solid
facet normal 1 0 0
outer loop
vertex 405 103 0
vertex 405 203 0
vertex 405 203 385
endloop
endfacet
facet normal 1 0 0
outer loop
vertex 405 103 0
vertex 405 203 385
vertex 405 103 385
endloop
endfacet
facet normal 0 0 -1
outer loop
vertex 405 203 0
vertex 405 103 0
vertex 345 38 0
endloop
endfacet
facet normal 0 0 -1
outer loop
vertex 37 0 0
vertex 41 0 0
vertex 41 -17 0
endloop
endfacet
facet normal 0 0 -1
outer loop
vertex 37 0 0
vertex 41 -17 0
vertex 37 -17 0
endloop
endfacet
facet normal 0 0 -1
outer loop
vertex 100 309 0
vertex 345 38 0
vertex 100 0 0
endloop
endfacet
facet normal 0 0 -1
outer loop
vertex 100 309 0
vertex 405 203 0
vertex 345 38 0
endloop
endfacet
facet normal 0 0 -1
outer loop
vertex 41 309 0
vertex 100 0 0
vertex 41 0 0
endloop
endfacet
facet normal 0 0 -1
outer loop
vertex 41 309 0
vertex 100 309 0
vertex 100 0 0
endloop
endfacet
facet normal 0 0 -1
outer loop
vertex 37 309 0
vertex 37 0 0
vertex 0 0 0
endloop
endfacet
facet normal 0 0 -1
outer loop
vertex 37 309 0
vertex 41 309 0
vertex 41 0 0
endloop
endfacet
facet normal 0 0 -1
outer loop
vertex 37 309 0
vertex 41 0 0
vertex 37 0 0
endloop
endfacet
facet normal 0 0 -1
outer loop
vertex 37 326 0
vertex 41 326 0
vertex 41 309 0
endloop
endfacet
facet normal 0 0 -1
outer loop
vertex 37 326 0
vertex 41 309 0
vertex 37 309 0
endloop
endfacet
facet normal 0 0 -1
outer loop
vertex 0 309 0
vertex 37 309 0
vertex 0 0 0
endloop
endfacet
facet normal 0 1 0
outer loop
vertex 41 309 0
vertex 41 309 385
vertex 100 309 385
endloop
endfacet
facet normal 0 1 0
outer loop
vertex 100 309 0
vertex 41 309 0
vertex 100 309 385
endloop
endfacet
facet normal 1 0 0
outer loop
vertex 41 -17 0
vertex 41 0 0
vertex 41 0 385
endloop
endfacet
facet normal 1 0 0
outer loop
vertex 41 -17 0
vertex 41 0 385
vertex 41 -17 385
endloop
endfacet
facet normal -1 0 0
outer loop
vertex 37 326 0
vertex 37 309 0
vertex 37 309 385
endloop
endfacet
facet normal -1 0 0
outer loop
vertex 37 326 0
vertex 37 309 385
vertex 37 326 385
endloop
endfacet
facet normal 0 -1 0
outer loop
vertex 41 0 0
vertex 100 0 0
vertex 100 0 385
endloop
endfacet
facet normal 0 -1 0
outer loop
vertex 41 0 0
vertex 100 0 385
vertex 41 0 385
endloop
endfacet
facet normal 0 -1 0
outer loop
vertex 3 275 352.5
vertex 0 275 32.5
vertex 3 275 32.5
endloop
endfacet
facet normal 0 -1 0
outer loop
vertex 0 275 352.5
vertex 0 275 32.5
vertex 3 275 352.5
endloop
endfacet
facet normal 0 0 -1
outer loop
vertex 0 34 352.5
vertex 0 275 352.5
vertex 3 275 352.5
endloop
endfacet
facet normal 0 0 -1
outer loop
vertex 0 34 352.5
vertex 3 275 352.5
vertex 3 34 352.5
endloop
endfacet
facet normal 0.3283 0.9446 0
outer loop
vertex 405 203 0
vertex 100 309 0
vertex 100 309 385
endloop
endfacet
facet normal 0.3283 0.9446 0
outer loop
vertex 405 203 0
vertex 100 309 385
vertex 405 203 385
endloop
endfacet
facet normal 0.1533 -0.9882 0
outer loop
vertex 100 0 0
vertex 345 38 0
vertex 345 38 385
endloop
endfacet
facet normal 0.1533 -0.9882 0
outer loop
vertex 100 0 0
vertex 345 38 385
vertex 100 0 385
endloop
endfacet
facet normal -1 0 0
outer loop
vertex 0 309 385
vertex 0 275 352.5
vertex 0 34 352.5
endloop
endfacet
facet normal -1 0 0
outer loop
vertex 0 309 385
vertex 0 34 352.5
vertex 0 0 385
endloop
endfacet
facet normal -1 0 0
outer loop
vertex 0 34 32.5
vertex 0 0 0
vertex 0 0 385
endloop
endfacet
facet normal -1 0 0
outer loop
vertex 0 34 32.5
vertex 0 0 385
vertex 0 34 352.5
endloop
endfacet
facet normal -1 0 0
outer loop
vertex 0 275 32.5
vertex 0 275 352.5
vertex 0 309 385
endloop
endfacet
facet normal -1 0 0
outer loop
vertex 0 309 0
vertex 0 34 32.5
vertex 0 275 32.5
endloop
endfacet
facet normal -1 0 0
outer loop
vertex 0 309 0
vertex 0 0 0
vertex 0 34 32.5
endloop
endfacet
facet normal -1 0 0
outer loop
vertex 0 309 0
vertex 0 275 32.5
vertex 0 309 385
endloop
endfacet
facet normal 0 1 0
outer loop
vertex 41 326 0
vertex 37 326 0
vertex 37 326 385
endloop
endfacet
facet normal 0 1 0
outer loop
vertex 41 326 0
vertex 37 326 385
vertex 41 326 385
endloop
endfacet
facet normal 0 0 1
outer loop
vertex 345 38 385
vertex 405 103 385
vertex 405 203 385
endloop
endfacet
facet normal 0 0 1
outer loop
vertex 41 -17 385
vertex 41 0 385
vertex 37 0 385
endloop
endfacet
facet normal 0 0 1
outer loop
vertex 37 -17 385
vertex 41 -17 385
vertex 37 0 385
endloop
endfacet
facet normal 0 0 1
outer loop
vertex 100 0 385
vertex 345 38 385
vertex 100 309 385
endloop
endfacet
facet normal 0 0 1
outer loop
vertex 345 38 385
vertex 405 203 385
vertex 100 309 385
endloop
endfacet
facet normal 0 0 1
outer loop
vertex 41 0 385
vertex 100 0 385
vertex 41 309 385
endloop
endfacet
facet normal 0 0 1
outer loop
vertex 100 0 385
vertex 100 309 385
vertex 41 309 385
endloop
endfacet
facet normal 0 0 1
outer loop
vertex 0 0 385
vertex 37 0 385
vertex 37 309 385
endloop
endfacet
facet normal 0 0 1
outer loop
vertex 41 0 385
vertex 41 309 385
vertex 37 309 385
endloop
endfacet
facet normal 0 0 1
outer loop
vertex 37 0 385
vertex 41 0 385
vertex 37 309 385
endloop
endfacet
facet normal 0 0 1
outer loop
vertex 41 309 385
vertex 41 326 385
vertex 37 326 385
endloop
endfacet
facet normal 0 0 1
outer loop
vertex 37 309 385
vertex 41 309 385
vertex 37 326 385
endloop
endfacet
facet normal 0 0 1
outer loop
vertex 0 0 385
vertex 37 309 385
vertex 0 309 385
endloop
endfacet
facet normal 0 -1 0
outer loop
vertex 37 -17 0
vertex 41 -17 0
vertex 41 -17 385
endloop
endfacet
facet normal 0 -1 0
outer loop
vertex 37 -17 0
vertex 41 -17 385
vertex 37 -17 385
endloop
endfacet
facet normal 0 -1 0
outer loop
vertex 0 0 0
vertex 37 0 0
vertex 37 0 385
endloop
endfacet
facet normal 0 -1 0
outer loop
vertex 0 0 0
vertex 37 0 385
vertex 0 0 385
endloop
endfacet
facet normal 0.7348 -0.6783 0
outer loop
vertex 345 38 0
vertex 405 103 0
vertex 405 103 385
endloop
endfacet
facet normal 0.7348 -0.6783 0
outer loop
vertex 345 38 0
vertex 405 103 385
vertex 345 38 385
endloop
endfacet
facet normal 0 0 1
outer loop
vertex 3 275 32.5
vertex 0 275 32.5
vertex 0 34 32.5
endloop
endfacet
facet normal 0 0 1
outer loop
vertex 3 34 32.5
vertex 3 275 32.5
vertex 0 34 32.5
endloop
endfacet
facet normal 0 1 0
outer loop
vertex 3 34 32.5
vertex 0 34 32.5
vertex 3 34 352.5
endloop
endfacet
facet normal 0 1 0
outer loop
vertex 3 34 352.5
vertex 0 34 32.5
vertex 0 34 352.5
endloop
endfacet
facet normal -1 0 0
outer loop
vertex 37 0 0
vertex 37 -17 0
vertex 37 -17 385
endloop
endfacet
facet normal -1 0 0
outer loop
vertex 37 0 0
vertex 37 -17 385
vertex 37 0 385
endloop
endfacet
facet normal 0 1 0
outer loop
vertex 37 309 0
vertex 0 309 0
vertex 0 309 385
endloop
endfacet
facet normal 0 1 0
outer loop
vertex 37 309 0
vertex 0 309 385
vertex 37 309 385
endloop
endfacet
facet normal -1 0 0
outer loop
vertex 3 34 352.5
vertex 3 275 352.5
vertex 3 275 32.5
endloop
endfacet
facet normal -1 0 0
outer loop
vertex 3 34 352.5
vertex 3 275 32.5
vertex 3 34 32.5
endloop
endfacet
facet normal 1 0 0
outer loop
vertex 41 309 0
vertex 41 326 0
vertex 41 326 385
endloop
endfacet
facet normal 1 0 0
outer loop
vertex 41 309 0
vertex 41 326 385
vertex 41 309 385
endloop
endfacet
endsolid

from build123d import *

# Parameters (mm, degrees)
PAD_DEPTH    = 385
SKETCH001_W  = 241
SKETCH001_H  = 320
POCKET_DEPTH = 3


with BuildPart() as part:
    # Sketch → Pad (new body)
    with BuildSketch(Plane.XY):
        Polygon((0, 0), (0, 309), (37, 309), (37, 326), (41, 326), (41, 309), (100, 309), (405, 203), (405, 103), (345, 38), (100, 0), (41, 0), (41, -17), (37, -17), (37, 0), align=None)
    extrude(amount=PAD_DEPTH)

    # Sketch001 (on Face1 of Pad) → Pocket (cut)
    with BuildSketch(Plane(origin=(0, 0, 0), x_dir=(0, -1, 0), z_dir=(-1, 0, 0))):
        with Locations((-154.5, 192.5)):
            Rectangle(SKETCH001_W, SKETCH001_H)
    extrude(amount=-POCKET_DEPTH, mode=Mode.SUBTRACT)


solid = part.part
